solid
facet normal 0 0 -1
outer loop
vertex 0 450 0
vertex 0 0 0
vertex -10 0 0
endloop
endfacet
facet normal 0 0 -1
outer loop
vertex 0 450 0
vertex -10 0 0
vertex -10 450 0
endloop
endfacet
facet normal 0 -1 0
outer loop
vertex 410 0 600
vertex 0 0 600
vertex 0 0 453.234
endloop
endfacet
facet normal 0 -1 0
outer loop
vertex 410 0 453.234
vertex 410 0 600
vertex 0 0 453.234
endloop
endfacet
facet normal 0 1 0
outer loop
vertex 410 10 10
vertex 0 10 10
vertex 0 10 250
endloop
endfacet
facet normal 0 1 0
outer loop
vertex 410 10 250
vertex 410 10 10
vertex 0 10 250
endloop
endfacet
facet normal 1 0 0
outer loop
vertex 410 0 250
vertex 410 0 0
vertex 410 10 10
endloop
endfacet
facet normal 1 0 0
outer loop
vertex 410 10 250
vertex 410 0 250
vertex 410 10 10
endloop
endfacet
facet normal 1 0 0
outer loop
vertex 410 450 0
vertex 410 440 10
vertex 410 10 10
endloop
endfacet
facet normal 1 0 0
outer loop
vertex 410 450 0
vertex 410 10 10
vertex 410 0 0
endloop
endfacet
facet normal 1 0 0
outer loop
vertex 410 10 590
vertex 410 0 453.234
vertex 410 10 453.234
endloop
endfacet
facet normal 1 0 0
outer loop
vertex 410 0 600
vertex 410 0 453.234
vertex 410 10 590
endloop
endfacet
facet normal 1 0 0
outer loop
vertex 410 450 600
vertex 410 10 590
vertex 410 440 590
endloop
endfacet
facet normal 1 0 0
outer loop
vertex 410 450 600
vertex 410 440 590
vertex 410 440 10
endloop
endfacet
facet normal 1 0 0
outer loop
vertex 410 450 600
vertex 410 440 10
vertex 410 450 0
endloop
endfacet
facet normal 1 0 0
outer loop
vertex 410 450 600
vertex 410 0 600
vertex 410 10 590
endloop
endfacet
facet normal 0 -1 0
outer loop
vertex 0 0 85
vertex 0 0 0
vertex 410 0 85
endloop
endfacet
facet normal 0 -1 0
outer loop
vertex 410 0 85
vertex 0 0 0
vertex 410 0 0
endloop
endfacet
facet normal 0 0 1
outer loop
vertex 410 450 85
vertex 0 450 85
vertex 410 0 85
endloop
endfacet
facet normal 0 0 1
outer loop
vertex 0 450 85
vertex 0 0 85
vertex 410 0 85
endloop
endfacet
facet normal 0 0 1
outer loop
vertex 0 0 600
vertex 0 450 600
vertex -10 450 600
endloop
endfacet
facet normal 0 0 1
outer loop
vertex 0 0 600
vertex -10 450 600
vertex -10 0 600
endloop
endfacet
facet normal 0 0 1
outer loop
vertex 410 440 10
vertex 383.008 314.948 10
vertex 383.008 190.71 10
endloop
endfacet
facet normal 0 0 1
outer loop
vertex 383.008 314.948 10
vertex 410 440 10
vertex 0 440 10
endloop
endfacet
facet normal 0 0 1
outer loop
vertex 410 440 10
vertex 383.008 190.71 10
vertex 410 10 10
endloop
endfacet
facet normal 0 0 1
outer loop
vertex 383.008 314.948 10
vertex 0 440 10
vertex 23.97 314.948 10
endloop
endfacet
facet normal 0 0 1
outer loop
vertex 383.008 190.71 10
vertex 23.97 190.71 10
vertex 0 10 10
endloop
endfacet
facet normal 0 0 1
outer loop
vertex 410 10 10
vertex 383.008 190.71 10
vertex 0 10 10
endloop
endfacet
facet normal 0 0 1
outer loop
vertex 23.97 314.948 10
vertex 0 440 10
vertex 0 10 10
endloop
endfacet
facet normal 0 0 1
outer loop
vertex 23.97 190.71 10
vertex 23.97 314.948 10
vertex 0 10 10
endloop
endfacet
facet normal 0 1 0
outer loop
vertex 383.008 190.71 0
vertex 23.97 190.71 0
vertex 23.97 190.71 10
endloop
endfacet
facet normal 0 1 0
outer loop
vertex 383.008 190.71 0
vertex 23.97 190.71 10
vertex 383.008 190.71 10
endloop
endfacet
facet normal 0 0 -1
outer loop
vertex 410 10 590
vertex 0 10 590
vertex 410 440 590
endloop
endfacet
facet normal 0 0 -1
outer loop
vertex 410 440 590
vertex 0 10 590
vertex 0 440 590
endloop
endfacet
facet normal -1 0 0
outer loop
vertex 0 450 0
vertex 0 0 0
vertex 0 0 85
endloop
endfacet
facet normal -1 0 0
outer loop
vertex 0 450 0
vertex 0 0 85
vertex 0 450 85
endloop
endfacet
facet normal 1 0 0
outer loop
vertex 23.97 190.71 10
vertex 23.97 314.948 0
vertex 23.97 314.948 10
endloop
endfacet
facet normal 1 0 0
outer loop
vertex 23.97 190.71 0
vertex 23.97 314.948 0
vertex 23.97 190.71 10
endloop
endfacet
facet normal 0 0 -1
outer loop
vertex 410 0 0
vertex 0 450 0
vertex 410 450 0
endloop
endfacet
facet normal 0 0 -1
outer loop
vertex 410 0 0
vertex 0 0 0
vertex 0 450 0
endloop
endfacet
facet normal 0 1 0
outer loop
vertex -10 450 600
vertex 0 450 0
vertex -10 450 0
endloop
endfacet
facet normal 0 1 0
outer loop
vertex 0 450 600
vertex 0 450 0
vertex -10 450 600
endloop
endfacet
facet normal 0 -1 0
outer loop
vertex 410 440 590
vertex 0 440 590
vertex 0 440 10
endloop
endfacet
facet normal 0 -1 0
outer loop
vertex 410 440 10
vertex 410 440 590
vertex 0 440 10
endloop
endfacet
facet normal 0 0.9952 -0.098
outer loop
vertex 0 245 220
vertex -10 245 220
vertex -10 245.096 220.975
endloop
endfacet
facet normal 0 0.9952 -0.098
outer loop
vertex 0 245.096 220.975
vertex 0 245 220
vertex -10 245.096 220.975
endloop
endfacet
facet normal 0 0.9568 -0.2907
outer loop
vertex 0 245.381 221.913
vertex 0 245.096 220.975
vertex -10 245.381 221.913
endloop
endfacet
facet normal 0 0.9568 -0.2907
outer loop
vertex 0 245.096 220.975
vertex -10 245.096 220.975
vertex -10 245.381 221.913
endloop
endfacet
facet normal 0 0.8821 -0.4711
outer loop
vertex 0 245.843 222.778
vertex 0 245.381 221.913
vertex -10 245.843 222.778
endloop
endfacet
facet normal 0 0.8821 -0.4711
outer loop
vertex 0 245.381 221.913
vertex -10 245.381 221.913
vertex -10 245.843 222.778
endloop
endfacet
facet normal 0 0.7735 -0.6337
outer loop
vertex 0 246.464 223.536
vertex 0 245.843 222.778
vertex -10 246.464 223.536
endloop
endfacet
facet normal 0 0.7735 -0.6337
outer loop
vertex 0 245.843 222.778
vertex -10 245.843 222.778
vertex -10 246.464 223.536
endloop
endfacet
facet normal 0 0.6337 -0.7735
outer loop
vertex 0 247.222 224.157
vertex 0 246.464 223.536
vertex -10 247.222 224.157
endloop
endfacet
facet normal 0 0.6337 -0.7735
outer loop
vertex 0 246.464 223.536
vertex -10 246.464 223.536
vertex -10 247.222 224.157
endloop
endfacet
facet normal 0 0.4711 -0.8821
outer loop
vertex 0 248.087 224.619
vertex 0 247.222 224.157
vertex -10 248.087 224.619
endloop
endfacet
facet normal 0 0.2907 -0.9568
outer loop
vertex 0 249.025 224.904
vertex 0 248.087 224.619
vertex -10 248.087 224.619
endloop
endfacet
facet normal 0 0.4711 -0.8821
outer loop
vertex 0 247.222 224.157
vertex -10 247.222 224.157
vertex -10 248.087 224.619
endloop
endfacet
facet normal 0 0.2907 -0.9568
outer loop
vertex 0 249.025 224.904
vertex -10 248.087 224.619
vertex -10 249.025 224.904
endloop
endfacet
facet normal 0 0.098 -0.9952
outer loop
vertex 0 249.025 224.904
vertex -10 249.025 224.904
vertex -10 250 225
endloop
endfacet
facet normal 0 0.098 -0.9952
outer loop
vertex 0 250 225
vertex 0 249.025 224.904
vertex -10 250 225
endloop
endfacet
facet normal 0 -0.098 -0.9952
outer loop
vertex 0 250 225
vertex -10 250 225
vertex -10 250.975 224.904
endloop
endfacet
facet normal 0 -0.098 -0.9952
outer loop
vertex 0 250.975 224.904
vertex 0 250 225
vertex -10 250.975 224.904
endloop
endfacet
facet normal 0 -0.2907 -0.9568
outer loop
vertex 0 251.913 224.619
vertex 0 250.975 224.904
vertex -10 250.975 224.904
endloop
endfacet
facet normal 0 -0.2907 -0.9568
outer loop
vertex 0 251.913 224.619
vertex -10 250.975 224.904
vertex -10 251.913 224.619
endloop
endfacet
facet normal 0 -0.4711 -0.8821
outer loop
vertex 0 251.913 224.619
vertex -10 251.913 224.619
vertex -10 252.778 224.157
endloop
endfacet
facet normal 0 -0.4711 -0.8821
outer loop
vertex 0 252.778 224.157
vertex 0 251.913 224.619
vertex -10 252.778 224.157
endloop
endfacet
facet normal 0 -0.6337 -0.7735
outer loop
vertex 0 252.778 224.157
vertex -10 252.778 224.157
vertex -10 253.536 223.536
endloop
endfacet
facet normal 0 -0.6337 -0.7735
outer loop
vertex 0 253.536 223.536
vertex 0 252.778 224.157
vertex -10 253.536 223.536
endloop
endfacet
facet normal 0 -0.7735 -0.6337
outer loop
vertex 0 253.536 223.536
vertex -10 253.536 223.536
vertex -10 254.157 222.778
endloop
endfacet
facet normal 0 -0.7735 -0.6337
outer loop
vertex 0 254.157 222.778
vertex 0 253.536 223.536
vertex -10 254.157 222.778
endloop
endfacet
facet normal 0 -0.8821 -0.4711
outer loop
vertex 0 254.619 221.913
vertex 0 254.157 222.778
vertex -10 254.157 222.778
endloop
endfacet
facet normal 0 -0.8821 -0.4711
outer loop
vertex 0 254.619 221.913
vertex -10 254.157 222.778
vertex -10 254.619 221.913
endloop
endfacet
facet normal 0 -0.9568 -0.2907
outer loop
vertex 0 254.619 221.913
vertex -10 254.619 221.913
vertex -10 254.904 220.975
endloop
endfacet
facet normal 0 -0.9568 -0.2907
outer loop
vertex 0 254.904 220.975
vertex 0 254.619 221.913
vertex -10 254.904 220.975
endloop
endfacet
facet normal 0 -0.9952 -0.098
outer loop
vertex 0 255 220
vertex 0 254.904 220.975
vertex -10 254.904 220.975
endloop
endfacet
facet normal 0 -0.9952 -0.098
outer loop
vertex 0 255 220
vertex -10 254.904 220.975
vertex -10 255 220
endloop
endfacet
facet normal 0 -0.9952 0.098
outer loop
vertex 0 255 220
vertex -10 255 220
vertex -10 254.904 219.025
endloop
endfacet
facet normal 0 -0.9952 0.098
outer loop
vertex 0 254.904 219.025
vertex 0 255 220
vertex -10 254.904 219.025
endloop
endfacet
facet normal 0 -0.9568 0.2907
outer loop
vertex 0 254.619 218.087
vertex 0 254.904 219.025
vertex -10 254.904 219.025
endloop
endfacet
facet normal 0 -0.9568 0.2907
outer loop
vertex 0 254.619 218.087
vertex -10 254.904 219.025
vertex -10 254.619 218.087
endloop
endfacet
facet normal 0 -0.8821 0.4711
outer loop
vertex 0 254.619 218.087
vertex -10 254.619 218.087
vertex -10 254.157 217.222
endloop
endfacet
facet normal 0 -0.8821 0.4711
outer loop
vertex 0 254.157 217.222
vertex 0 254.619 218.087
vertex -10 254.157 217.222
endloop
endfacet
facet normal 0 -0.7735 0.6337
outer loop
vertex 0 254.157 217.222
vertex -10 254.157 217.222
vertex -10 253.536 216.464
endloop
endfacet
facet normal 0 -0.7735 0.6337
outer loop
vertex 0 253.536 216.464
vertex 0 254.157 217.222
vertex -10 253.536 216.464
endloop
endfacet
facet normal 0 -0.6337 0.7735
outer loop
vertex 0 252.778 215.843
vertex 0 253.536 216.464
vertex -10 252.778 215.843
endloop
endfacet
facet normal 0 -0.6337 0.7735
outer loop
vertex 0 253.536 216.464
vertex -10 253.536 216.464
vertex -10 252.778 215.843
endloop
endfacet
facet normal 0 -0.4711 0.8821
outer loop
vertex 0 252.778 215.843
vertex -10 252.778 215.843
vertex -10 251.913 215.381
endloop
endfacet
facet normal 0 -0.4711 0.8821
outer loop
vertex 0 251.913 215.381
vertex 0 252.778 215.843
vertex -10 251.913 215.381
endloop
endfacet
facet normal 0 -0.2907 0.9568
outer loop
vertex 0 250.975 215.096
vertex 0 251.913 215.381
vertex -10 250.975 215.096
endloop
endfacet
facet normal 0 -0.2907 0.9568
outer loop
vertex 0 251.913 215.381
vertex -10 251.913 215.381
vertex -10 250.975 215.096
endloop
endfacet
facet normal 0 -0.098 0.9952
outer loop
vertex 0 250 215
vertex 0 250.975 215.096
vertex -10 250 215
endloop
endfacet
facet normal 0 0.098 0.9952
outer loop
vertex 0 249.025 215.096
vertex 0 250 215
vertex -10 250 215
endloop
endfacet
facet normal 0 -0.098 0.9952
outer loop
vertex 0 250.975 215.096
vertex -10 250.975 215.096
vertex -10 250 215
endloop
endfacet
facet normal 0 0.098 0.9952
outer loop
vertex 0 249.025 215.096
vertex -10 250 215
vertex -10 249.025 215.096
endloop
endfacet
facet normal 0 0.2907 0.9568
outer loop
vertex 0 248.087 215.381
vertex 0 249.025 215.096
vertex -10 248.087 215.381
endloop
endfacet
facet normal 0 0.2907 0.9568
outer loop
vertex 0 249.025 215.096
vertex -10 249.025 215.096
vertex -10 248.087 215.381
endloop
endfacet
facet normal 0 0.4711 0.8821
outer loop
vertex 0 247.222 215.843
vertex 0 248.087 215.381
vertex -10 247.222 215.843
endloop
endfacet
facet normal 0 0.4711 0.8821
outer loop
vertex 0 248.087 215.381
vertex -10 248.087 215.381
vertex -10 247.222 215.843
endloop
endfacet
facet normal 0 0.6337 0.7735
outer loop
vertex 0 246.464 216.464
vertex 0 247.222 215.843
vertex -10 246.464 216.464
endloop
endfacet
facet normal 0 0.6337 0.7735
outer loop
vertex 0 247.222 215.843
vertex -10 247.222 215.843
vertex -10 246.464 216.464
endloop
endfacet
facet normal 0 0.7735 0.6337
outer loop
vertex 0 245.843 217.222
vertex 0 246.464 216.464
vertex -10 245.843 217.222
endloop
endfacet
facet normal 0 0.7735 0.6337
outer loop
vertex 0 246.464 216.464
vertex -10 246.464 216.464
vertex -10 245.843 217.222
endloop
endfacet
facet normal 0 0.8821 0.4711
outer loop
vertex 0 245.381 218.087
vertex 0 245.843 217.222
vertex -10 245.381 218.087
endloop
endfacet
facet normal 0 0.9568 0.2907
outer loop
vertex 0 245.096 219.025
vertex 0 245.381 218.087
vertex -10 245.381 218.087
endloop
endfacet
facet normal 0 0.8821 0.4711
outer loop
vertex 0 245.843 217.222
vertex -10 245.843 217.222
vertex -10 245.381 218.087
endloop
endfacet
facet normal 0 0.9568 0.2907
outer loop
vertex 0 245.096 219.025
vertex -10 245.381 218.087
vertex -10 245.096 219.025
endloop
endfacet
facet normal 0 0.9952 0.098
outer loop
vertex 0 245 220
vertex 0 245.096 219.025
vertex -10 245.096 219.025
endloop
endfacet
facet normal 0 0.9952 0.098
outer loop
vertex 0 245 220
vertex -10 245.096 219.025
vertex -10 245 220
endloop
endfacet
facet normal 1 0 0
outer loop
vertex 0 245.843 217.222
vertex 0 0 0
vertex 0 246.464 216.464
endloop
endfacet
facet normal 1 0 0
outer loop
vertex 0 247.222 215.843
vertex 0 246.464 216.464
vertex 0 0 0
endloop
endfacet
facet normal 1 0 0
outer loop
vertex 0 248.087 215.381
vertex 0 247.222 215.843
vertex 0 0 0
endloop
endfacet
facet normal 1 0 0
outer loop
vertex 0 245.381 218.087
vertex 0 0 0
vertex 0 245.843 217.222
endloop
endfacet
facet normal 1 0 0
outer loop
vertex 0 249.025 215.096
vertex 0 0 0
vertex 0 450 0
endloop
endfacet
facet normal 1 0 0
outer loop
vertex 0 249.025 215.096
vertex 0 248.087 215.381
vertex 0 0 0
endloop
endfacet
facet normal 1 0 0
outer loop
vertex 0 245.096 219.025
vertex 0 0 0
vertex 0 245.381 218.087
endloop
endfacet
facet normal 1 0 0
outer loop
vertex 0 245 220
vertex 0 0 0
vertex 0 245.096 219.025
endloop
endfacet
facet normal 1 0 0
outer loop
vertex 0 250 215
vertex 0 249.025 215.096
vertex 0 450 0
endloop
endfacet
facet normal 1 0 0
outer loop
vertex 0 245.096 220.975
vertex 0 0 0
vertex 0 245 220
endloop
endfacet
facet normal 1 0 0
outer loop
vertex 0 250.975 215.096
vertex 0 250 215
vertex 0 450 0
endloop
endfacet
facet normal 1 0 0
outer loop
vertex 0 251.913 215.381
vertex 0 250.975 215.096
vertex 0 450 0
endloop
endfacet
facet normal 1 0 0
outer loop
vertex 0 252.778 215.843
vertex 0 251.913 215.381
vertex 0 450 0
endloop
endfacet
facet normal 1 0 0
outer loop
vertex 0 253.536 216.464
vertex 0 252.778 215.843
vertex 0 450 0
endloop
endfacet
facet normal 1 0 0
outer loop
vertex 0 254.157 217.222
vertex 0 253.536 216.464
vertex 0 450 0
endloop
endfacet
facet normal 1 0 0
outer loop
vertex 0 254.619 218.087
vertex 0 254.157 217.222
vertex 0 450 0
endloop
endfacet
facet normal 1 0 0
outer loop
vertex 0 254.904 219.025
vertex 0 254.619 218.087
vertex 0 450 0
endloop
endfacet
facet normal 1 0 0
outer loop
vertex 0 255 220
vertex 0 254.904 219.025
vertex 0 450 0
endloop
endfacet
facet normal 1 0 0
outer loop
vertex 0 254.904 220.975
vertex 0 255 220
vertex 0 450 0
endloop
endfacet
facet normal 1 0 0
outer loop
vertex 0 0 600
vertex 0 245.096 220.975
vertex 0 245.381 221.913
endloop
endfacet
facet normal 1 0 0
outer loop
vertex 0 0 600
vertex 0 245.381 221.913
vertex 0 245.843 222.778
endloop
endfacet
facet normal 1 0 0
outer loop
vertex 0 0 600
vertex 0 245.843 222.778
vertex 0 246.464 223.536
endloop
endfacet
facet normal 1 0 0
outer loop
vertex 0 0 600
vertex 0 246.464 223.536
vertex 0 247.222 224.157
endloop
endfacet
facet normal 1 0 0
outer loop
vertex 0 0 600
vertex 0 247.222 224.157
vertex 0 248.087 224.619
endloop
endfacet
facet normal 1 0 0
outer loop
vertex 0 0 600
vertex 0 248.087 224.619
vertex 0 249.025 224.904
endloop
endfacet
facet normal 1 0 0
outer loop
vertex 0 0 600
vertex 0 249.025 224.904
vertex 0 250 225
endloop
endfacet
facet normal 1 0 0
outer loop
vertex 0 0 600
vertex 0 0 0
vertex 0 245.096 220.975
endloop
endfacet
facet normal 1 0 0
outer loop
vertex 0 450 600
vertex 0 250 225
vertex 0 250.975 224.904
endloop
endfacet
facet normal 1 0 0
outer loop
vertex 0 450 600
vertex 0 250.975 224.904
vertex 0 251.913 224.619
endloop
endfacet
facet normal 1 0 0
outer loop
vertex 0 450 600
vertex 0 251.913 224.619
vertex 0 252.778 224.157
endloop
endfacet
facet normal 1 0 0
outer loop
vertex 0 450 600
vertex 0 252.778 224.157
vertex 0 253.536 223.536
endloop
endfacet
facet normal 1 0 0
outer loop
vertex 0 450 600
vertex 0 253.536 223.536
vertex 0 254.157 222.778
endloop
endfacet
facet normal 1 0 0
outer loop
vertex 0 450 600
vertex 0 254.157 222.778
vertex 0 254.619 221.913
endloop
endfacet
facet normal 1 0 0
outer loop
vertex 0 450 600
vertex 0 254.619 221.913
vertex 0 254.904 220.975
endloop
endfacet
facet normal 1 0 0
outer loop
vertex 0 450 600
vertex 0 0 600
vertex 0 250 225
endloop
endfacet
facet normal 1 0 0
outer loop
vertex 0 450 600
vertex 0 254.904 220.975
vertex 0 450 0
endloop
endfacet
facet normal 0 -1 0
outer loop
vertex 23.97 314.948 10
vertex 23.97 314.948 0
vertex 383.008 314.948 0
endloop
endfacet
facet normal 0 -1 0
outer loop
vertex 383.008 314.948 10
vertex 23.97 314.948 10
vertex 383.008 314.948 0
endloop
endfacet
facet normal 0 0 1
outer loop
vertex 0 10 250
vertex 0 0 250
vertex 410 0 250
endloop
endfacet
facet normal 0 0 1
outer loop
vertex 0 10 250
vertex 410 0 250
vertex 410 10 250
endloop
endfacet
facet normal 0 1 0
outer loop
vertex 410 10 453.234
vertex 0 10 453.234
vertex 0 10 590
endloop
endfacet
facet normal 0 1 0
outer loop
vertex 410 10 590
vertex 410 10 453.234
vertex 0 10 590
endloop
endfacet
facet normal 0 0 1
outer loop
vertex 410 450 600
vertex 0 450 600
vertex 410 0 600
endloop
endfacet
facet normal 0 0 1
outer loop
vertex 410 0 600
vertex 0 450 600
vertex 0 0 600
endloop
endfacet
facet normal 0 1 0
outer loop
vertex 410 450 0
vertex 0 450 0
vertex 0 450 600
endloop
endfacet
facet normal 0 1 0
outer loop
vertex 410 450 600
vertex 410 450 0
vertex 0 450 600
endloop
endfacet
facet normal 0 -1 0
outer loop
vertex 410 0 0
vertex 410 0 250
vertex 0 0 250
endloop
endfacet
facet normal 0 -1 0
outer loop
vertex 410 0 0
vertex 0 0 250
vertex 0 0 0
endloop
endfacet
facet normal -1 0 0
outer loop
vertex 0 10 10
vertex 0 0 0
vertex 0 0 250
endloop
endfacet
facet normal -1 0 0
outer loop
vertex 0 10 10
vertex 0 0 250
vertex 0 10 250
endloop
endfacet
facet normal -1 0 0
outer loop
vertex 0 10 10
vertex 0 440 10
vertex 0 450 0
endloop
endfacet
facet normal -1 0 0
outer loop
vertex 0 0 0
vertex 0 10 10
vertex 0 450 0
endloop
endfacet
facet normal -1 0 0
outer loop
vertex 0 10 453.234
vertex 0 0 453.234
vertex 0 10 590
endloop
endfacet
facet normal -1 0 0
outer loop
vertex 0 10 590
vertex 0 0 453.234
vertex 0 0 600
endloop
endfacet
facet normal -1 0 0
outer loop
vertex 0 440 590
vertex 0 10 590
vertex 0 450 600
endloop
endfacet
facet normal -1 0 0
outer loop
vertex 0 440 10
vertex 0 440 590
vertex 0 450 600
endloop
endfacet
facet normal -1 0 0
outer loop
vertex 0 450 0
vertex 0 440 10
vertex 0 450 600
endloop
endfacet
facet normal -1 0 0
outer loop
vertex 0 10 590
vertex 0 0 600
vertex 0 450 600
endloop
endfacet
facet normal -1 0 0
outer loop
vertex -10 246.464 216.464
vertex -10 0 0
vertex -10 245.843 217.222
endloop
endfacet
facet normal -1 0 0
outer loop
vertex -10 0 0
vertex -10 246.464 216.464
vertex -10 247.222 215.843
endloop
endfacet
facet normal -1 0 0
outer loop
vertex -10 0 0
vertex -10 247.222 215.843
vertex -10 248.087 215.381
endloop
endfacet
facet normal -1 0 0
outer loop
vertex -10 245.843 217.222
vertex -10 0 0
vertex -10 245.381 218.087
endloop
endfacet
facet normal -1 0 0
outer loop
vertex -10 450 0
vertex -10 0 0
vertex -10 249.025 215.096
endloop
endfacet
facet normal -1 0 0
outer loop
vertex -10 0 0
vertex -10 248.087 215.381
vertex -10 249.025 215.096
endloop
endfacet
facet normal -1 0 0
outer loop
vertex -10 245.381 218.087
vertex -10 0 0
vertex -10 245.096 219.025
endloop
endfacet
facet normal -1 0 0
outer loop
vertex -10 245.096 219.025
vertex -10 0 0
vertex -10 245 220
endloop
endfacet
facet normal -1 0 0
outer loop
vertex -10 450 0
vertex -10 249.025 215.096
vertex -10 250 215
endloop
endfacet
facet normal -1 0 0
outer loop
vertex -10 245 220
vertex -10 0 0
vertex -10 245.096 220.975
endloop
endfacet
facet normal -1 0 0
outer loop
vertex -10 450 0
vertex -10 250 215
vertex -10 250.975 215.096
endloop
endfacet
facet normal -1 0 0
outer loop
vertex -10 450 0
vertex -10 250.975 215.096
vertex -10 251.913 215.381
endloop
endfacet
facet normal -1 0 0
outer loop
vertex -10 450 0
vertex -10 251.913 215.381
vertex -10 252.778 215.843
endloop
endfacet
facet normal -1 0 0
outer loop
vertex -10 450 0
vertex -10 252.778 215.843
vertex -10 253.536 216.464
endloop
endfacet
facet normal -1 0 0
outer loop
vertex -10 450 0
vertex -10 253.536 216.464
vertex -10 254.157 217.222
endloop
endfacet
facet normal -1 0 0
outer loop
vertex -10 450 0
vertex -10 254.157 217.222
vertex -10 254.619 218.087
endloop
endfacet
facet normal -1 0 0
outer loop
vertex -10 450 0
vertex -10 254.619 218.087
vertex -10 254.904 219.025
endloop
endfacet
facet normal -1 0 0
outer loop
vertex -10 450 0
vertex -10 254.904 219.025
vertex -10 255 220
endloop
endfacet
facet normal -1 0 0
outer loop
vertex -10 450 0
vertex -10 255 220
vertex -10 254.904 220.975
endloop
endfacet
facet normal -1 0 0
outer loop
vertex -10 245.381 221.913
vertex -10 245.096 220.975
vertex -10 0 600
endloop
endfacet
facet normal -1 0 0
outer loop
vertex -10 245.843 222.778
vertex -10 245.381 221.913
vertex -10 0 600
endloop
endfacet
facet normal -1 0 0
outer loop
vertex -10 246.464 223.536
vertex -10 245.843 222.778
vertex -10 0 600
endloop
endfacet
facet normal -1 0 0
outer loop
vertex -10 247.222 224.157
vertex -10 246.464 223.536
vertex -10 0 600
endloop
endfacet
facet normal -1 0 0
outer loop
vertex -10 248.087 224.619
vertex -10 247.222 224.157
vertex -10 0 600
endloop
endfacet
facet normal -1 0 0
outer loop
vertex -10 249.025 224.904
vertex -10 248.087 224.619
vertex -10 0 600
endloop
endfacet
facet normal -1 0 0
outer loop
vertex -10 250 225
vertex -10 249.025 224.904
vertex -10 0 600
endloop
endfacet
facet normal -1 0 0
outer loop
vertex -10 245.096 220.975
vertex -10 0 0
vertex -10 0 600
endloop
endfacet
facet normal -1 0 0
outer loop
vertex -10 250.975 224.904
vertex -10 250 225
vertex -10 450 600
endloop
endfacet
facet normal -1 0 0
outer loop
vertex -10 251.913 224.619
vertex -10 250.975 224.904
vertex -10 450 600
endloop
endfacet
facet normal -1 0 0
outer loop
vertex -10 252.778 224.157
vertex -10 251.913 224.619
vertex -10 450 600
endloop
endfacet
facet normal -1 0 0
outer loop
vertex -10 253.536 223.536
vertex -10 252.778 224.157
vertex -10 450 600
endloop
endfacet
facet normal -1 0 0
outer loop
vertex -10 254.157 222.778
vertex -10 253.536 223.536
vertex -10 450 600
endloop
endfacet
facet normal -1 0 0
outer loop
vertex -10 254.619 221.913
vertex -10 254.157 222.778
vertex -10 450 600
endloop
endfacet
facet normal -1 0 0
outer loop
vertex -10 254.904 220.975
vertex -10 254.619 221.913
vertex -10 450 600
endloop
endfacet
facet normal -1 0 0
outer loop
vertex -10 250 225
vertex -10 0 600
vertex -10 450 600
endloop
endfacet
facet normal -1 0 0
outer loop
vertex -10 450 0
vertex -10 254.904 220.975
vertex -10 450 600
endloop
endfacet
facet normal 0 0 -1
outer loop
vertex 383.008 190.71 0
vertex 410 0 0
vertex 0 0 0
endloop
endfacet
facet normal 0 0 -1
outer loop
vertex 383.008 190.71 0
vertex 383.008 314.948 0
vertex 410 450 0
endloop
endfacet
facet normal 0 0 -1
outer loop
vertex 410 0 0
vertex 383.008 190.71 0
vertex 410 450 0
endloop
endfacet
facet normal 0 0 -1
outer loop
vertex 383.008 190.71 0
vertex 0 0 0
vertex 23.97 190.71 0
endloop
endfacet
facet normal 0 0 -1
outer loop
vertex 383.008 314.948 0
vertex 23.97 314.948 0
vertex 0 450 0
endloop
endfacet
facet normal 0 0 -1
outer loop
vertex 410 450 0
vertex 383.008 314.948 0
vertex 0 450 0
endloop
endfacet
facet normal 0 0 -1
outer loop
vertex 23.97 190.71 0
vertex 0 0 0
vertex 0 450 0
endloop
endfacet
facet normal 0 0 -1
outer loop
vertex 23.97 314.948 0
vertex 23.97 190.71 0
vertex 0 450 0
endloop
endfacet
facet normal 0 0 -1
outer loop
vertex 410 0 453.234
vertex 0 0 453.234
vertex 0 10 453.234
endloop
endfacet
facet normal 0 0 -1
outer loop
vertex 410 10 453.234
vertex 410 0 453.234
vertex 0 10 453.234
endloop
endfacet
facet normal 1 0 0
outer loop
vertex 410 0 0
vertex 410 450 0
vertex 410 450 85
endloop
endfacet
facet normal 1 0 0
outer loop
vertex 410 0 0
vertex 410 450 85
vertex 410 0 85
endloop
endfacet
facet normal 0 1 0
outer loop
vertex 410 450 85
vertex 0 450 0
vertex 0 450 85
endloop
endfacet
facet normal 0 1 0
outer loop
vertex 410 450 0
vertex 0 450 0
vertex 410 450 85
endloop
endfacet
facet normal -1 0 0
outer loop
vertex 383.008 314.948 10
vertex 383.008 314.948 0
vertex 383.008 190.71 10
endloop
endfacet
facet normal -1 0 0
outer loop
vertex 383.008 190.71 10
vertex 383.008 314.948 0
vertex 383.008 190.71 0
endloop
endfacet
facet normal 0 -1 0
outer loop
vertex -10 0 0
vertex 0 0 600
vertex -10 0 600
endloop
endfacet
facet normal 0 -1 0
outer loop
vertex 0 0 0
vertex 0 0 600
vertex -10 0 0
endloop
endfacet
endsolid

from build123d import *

# Parameters (mm, degrees)
F0_W     = 10
F0_H     = 136.7661619186
F0_H_2   = 240
F1_DEPTH = 410
F2_DEPTH = 10
F3_R     = 5
F4_DEPTH = 25
F6_W     = 359.0383380651
F6_H     = 124.2373585701
F7_DEPTH = 25
F5_W     = 410
F5_H     = 135.0524842739
F5_H_2   = 190.710157156
F5_H_3   = 124.2373585701
F8_DEPTH = 85


with BuildPart() as f1:
    # F0 (on Right) → F1 (new body)
    with BuildSketch(Plane.YZ):
        with Locations((5, 521.6169190407)):
            Rectangle(F0_W, F0_H)
        Polygon((440, 10), (450, 10), (450, 600), (440, 600), (440, 590), align=None)
        Polygon((440, 590), (440, 600), (0, 600), (0, 590), (10, 590), align=None)
        with Locations((5, 130)):
            Rectangle(F0_W, F0_H_2)
        Polygon((0, 10), (0, 0), (450, 0), (450, 10), (440, 10), (10, 10), align=None)
    extrude(amount=F1_DEPTH)

    # F6 (on face) → F7 (cut)
    with BuildSketch(Plane(origin=(0, 0, 0), x_dir=(1, 0, 0), z_dir=(0, 0, -1))):
        with Locations((203.4892514348, -252.828836441)):
            Rectangle(F6_W, F6_H)
    extrude(amount=-F7_DEPTH, mode=Mode.SUBTRACT)


with BuildPart() as f2:
    # F0 (on Right) → F2 (new body)
    with BuildSketch(Plane.YZ):
        Polygon((440, 590), (440, 600), (0, 600), (0, 590), (10, 590), align=None)
        with Locations((5, 521.6169190407)):
            Rectangle(F0_W, F0_H)
        Polygon((440, 10), (450, 10), (450, 600), (440, 600), (440, 590), align=None)
        with Locations((5, 130)):
            Rectangle(F0_W, F0_H_2)
        Polygon((0, 10), (0, 0), (450, 0), (450, 10), (440, 10), (10, 10), align=None)
        Polygon((0, 453.2338380814), (0, 250), (10, 250), (10, 10), (440, 10), (440, 590), (10, 590), (10, 453.2338380814), align=None)
    extrude(amount=-F2_DEPTH)

    # F3 (on face) → F4 (cut)
    with BuildSketch(Plane(origin=(-10, 0, 0), x_dir=(0, -1, 0), z_dir=(-1, 0, 0))):
        with Locations((-250, 220)):
            Circle(F3_R)
    extrude(amount=-F4_DEPTH, mode=Mode.SUBTRACT)


with BuildPart() as f8:
    # F5 (on face) → F8 (new body)
    with BuildSketch(Plane(origin=(0, 0, 0), x_dir=(1, 0, 0), z_dir=(0, 0, -1))):
        with Locations((205, -382.473757863)):
            Rectangle(F5_W, F5_H)
        with Locations((205, -95.355078578)):
            Rectangle(F5_W, F5_H_2)
        with Locations((205, -252.828836441)):
            Rectangle(F5_W, F5_H_3)
    extrude(amount=-F8_DEPTH)


solid = Compound([f1.part, f2.part, f8.part])
